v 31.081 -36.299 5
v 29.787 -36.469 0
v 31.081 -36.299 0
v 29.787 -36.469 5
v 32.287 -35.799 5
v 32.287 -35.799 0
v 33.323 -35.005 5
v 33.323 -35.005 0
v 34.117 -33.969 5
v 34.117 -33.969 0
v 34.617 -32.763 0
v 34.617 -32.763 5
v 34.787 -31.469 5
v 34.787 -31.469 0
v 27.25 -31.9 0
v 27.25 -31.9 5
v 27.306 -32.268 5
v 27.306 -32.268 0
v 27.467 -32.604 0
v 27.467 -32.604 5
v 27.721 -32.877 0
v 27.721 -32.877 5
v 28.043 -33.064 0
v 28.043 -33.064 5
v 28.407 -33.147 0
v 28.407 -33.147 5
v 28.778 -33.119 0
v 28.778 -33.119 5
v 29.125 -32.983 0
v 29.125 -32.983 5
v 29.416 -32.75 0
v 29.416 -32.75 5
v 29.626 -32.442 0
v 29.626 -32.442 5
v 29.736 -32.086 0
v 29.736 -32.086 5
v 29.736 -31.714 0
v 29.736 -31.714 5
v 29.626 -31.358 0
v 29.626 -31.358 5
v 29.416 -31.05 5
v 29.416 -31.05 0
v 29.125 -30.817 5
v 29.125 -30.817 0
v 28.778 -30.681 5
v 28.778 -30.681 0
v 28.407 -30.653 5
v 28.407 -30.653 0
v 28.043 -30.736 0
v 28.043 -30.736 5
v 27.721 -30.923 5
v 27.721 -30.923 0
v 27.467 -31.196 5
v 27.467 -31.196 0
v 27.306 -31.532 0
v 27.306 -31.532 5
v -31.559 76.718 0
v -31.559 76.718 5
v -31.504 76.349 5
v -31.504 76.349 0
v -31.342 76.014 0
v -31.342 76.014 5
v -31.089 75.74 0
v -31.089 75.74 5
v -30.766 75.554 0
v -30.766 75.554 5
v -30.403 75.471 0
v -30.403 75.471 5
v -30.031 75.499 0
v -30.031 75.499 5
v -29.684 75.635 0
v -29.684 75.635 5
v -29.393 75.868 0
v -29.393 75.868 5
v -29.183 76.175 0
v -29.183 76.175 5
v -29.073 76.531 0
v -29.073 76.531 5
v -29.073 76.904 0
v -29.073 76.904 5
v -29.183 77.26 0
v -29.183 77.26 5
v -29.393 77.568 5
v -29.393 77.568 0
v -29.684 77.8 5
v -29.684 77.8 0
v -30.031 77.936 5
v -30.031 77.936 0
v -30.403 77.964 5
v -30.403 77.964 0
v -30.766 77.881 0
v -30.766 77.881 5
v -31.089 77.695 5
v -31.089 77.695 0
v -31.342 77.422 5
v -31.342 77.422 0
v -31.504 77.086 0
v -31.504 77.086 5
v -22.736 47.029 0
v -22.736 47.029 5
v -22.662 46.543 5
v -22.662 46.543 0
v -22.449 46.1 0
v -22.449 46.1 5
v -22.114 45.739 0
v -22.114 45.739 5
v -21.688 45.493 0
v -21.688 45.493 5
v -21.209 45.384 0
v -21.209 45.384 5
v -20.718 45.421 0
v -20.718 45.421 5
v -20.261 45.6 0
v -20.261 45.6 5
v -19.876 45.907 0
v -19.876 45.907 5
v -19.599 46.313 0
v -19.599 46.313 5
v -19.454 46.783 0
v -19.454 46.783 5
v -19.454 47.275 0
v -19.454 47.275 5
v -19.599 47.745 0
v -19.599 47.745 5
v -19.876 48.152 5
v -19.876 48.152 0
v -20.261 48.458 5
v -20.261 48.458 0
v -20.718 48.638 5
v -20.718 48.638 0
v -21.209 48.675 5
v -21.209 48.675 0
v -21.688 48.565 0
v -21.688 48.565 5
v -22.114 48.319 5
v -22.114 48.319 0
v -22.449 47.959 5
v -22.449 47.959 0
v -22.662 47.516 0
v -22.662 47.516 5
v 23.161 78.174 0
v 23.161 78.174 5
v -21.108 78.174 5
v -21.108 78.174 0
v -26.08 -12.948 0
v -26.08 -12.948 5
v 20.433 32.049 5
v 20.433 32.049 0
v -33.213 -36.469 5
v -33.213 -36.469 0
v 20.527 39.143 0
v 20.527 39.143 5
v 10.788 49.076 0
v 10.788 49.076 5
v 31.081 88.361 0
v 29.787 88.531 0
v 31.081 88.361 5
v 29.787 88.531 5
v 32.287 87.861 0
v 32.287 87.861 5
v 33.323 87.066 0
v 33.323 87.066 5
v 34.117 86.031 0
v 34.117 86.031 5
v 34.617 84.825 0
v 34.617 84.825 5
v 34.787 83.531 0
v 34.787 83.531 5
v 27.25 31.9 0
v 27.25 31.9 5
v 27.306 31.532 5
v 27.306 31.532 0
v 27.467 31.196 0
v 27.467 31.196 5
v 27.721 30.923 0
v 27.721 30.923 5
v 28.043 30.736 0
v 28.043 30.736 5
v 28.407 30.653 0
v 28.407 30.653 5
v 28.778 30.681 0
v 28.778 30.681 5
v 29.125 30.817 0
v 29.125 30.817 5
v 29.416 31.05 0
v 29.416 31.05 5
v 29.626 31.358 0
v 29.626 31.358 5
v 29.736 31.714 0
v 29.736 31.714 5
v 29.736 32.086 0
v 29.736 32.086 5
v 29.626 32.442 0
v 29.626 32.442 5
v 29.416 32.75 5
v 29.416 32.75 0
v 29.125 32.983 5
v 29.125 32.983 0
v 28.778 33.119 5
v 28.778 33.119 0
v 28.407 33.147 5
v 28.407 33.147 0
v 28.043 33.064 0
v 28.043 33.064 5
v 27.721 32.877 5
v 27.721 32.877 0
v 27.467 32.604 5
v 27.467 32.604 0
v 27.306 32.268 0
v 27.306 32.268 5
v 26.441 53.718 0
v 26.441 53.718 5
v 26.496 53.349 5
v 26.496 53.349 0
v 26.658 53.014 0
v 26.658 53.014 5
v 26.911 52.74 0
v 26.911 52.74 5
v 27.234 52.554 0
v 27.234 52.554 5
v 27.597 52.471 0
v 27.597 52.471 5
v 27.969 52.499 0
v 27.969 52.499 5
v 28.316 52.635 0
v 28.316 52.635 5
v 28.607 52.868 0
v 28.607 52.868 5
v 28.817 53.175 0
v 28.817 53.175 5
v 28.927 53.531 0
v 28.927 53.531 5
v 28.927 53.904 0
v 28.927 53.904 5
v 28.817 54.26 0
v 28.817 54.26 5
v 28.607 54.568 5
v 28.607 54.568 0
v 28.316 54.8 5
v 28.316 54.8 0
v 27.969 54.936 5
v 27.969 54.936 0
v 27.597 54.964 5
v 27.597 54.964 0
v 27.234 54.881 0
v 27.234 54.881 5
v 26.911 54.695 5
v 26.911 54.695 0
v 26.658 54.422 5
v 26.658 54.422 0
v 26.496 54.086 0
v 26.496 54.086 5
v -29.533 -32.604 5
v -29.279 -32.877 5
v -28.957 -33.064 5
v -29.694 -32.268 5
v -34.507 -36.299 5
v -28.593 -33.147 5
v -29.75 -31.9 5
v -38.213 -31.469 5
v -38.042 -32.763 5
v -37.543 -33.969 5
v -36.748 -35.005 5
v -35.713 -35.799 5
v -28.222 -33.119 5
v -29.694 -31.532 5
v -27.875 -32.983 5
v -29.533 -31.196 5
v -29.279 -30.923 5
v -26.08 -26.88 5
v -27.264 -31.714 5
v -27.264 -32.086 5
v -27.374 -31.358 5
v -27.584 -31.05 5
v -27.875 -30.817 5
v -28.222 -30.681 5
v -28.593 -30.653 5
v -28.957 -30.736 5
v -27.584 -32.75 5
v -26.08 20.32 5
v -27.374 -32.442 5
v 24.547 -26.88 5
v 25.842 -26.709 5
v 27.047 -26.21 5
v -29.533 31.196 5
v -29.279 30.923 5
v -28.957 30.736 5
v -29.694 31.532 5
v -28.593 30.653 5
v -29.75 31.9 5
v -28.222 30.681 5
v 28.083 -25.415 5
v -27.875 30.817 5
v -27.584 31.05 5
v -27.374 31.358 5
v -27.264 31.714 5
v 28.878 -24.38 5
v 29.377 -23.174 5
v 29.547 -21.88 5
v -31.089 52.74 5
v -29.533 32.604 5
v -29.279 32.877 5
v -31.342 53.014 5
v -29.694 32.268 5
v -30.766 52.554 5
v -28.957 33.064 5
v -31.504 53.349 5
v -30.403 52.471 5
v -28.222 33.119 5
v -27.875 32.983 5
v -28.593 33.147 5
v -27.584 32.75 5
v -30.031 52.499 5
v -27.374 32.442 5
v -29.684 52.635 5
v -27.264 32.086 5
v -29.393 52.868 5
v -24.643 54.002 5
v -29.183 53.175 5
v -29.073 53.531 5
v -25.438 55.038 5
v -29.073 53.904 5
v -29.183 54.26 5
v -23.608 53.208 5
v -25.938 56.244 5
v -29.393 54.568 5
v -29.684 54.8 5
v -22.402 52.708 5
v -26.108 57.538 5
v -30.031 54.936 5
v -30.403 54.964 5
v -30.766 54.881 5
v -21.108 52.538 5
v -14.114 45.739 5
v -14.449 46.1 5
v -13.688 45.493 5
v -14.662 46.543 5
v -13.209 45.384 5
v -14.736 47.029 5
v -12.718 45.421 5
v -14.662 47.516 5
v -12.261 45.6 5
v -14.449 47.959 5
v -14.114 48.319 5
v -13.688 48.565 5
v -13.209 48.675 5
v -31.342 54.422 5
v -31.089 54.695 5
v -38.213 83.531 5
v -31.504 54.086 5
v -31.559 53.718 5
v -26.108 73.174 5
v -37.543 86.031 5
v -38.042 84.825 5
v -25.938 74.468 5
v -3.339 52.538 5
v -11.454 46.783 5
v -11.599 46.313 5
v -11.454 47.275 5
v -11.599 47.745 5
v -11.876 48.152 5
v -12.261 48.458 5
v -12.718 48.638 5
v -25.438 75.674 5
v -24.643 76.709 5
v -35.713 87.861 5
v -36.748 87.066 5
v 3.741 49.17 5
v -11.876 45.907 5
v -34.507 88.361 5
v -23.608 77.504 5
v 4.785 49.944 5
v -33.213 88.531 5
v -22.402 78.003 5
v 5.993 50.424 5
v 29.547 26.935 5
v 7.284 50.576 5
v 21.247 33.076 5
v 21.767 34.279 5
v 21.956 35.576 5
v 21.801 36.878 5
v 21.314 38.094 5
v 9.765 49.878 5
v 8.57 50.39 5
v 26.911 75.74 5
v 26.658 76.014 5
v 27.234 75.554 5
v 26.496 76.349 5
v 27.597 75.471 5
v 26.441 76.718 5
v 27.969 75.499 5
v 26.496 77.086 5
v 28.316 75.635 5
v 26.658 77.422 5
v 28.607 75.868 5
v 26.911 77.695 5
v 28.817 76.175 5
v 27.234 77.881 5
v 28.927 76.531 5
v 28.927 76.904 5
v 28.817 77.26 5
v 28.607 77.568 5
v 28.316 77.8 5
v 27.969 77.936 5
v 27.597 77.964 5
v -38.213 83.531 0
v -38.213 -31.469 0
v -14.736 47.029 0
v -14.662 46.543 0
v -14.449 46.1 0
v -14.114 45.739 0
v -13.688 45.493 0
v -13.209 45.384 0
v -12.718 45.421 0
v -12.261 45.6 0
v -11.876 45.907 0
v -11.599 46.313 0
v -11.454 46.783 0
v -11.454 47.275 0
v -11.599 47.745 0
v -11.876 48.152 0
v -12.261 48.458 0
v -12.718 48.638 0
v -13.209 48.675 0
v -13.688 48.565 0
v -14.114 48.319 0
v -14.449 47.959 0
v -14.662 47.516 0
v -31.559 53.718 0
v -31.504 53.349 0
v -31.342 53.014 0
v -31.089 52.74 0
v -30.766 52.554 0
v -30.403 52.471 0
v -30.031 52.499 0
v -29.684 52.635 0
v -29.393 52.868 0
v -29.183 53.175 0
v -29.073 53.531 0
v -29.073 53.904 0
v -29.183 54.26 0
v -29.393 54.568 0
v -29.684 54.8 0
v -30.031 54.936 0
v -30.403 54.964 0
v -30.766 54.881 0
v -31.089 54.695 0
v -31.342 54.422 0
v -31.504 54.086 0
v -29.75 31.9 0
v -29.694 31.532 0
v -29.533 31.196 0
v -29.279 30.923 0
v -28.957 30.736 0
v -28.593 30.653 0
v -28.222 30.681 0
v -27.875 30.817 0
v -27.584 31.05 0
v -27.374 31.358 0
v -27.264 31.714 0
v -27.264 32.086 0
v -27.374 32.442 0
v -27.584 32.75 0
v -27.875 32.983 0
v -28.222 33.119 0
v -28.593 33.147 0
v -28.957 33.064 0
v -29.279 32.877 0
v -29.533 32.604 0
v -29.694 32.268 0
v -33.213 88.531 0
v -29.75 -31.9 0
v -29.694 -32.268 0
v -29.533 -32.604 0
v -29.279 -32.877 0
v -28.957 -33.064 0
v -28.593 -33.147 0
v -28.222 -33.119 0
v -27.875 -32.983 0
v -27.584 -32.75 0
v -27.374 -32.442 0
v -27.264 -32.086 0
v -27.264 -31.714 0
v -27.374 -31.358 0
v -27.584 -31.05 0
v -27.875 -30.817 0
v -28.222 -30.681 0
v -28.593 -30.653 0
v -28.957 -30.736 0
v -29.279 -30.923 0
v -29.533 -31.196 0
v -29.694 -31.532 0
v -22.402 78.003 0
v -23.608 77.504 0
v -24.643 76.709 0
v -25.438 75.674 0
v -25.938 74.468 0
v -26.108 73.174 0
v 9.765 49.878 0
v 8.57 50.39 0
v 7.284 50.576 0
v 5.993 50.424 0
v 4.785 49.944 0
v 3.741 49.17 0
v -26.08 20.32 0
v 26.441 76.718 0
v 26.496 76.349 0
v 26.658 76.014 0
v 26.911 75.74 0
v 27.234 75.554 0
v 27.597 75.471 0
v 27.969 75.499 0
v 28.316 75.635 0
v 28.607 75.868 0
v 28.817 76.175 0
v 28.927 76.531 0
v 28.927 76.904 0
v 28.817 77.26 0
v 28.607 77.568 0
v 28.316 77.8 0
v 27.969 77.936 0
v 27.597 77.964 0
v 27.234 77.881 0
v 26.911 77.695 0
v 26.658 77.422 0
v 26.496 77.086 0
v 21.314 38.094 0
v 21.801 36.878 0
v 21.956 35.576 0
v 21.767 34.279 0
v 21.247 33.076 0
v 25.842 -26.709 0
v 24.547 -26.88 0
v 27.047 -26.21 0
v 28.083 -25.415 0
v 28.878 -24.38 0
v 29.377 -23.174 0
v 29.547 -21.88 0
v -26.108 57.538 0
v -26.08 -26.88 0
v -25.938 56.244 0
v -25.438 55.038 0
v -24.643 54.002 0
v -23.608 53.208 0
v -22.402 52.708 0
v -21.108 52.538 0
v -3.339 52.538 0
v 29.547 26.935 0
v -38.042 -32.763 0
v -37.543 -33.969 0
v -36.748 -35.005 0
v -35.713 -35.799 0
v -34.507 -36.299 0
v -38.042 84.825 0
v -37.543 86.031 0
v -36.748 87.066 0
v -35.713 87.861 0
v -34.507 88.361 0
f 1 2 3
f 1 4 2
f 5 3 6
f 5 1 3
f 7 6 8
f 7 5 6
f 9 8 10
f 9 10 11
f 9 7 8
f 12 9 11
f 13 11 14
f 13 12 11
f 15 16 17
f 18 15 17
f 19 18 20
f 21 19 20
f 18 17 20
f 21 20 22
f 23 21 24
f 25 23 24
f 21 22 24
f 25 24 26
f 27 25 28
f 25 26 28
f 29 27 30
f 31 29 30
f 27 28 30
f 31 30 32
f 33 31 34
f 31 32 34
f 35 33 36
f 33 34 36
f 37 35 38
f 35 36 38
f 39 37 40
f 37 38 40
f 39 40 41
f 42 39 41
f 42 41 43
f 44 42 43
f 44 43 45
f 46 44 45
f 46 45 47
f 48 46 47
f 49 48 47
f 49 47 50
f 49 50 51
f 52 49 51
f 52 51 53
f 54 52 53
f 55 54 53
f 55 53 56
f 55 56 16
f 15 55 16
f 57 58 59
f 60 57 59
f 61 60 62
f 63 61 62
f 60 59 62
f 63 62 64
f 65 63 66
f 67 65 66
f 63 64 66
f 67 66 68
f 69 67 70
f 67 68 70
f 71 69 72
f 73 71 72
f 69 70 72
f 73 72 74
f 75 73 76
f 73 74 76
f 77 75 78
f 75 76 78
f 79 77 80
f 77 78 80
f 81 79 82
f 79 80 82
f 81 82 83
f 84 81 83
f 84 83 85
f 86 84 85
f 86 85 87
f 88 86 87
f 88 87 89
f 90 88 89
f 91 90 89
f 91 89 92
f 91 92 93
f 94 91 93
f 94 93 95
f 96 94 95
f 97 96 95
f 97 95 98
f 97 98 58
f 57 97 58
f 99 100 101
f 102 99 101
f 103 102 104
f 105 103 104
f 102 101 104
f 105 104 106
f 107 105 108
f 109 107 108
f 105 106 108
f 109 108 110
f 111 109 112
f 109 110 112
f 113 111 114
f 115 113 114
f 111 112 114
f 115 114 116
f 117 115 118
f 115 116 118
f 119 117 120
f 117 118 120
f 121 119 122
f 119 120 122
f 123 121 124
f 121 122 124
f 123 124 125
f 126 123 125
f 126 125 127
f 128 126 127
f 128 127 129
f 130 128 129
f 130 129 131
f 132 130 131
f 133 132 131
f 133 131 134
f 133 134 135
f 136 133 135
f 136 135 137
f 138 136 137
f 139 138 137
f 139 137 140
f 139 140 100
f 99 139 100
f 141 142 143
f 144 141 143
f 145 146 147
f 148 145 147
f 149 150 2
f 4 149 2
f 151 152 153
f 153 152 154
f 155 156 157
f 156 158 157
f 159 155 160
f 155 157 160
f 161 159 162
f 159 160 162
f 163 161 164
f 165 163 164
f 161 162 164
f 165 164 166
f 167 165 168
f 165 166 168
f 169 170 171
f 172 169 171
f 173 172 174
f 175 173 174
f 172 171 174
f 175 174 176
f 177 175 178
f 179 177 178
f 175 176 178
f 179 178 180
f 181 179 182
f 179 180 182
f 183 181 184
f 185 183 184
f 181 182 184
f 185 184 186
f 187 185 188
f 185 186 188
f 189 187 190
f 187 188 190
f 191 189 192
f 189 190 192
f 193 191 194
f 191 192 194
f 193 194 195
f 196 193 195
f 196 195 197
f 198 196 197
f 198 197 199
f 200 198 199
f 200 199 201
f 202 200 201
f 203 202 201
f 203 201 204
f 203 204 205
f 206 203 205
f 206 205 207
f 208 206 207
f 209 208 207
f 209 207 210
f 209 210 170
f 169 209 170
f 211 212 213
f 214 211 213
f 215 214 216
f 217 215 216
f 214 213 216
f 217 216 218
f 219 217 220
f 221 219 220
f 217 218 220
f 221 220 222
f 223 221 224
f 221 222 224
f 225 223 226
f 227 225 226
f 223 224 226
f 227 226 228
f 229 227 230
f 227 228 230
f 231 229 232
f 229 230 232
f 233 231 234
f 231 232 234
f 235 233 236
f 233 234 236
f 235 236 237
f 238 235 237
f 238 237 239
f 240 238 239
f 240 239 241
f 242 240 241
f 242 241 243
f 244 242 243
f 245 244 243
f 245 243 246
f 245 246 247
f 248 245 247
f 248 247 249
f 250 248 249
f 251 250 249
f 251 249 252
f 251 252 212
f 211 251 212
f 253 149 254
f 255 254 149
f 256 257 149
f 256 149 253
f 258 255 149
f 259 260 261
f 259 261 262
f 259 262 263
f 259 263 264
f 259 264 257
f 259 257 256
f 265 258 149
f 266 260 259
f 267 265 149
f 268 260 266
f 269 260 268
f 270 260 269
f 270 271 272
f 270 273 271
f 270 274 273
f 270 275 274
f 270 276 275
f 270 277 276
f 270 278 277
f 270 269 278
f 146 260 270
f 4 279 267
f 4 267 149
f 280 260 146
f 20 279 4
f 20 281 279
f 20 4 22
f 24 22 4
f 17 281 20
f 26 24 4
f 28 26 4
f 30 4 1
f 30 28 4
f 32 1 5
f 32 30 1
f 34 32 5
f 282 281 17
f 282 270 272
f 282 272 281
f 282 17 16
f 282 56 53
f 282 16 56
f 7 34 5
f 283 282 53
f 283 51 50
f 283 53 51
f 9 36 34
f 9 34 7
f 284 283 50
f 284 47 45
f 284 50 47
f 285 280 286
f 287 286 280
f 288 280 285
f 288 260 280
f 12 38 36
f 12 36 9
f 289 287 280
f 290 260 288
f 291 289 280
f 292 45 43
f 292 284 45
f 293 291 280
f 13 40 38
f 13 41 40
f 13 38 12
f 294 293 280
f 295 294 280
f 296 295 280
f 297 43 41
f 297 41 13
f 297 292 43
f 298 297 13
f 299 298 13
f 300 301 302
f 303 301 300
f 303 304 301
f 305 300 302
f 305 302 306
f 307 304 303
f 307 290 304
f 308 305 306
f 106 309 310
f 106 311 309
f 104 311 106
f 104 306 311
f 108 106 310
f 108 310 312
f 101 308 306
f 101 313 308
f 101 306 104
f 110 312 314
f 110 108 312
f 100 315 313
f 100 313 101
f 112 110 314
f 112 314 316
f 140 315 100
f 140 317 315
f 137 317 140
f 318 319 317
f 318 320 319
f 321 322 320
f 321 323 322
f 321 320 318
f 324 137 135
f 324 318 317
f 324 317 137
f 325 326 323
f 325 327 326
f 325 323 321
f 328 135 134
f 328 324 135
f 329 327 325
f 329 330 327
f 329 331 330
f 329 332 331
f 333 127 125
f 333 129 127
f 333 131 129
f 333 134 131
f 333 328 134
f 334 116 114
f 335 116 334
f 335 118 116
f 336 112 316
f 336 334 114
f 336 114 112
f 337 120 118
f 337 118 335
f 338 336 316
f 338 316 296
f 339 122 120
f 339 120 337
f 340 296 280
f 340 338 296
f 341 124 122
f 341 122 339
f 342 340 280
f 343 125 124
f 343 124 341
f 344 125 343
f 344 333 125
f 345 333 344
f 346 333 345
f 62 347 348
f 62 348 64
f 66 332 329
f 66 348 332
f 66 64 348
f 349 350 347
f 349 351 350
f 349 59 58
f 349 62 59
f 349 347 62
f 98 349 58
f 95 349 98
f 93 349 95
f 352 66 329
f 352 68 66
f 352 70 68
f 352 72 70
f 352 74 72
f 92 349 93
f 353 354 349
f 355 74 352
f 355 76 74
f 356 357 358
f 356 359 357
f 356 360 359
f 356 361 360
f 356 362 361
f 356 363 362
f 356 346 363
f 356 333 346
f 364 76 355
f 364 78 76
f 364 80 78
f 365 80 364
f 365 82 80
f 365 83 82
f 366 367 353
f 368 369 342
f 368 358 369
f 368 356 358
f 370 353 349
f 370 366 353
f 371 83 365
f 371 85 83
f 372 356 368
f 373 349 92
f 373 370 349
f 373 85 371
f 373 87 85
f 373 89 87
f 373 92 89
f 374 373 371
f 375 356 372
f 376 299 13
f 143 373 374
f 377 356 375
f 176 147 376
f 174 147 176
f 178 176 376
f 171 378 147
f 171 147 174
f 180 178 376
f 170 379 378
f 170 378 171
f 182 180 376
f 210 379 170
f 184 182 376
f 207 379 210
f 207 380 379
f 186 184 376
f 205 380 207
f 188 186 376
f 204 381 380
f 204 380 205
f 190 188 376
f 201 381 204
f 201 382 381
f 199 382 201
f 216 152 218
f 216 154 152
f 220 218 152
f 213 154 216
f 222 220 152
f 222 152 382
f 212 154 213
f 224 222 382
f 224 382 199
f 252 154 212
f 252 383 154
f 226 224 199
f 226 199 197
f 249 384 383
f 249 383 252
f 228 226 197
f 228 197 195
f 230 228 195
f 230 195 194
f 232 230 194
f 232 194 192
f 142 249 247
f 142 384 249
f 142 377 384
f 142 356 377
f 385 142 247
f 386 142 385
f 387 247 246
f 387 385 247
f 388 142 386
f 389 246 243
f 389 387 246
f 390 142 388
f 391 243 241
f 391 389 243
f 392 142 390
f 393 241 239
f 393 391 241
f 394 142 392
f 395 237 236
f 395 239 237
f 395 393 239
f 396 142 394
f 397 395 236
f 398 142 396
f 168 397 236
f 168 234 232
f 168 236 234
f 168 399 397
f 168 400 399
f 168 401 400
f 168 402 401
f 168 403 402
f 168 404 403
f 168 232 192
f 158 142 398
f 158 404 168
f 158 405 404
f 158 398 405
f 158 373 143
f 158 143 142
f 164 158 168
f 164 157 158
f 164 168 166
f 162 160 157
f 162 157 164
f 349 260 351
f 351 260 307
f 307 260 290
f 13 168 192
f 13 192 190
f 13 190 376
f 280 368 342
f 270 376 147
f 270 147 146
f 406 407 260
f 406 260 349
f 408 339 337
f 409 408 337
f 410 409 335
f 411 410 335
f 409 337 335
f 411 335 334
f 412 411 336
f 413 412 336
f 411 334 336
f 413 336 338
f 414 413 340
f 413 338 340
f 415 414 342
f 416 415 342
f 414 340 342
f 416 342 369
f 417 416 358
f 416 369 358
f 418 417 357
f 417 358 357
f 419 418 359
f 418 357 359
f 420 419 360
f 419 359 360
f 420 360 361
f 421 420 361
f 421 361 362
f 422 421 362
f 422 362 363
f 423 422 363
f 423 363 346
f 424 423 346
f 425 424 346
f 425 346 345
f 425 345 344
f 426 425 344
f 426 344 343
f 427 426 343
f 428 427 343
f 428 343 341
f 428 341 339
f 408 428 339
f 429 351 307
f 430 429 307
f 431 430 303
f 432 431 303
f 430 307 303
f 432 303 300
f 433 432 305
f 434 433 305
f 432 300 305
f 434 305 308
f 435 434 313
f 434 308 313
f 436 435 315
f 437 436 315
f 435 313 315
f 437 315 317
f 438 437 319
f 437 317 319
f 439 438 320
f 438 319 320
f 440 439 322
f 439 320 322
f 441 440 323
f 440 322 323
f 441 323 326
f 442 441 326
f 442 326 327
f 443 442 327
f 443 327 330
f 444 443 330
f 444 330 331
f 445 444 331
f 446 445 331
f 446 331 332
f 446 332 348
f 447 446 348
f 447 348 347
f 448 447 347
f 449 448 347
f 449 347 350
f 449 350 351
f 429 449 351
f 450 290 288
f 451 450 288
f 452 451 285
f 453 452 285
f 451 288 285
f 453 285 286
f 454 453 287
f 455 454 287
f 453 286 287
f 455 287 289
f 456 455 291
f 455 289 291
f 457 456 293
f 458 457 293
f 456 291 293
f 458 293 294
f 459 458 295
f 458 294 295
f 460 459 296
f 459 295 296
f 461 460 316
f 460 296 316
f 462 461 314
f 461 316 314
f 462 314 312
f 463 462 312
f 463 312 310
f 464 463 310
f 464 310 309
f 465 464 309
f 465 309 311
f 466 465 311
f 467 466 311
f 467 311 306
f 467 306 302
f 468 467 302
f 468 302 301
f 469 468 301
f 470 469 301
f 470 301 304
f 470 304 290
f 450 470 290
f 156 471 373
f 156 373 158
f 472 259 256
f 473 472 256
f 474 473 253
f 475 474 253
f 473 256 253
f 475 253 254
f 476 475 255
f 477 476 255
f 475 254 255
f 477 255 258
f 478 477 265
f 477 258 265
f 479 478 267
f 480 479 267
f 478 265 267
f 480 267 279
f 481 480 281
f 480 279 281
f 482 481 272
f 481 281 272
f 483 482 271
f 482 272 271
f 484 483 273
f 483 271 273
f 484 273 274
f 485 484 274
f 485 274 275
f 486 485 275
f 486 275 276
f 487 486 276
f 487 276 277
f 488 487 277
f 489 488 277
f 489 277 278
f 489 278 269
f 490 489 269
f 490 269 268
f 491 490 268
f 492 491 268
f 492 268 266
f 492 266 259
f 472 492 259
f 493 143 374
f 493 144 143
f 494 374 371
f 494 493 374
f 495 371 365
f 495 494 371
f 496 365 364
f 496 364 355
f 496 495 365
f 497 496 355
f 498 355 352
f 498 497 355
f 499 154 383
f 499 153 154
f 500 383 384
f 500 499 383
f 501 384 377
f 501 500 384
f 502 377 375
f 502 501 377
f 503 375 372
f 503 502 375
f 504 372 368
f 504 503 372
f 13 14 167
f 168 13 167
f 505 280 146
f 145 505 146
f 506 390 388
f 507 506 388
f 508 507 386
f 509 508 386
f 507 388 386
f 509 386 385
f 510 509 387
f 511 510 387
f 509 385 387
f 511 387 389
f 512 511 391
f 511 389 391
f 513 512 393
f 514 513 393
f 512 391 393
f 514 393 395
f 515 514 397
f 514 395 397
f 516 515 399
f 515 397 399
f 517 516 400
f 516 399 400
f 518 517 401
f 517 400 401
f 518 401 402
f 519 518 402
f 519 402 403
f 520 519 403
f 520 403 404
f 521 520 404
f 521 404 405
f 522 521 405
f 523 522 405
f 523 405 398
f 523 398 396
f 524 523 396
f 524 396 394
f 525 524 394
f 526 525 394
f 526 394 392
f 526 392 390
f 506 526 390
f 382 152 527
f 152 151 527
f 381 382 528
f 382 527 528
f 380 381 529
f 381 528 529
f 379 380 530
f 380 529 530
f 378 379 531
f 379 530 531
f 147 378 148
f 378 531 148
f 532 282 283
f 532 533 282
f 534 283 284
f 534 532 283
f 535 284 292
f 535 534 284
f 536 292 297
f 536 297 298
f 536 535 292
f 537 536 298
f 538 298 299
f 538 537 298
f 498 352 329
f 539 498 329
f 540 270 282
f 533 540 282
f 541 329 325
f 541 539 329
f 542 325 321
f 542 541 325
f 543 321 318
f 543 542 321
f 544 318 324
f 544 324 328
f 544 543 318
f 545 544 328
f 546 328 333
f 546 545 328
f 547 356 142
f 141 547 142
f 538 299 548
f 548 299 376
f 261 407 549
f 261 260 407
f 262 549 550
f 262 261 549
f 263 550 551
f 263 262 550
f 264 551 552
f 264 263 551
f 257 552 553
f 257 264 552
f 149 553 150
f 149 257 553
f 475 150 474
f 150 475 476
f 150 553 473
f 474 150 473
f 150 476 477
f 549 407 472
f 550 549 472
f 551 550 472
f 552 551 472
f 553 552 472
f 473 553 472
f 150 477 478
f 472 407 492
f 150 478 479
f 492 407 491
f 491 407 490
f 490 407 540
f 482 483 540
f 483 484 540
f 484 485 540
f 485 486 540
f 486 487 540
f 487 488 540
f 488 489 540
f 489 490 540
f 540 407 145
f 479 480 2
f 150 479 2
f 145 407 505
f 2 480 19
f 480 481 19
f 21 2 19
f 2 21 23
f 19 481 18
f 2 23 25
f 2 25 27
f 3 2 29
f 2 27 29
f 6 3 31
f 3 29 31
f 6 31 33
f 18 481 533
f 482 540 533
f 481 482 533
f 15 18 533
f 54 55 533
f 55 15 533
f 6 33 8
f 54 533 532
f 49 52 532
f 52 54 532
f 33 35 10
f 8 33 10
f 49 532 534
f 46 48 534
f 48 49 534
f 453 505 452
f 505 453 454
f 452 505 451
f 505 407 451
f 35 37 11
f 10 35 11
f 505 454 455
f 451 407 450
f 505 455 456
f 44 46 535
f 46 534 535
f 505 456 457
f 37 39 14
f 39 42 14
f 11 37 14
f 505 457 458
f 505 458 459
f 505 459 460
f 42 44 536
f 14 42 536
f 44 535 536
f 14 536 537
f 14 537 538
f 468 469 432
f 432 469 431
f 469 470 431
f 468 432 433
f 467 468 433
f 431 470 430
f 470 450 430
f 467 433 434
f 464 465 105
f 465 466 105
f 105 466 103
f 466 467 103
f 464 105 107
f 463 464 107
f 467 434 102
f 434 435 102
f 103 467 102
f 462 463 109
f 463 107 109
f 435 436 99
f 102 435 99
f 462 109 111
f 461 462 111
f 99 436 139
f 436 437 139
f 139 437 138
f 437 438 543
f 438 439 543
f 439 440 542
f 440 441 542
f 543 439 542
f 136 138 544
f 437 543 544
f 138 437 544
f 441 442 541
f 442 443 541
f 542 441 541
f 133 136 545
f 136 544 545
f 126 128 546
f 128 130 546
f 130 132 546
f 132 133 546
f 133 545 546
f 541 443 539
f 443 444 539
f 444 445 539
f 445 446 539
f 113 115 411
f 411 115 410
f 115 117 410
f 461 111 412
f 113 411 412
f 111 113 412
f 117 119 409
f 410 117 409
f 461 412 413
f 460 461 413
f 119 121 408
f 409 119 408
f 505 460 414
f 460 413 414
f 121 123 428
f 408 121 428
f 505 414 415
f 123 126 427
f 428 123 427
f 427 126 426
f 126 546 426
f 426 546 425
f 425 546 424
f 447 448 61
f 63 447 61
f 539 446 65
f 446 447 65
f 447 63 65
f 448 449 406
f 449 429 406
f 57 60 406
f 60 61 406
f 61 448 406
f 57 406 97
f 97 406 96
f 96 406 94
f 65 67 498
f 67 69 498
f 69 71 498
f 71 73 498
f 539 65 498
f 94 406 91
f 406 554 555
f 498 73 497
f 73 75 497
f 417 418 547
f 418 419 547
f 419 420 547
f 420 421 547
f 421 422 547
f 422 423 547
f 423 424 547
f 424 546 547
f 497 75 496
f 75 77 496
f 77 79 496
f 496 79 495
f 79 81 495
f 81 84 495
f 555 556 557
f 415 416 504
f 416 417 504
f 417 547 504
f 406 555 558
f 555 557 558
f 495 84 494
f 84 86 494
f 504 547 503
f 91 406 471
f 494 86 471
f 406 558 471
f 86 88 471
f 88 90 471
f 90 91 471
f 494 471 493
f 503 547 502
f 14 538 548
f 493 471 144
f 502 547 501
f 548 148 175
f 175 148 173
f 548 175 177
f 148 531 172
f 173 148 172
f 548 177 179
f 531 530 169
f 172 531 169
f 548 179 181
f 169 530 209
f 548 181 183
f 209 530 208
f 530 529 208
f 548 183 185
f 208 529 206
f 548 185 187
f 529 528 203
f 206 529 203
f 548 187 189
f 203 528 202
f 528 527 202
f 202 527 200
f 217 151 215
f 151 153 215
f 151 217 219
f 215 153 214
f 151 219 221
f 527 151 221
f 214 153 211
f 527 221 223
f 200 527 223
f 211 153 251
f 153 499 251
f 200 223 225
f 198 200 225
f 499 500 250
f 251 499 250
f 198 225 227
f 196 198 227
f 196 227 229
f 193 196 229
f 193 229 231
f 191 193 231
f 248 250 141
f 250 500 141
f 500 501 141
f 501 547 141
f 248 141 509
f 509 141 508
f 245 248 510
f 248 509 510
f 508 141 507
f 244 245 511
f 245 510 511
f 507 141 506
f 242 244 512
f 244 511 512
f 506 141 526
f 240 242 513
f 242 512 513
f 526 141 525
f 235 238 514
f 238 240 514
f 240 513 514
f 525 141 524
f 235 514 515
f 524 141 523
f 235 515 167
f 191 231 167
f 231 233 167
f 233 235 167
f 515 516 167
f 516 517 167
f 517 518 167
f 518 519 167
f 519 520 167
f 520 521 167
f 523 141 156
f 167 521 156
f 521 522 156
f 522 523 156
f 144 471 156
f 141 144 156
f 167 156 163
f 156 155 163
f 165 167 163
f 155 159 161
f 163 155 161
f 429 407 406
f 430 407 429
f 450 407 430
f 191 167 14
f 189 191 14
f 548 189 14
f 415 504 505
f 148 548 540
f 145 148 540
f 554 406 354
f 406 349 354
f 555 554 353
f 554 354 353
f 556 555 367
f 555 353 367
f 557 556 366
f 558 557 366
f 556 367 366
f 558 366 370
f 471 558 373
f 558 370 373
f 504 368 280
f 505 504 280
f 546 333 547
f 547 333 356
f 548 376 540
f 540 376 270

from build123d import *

# Parameters (mm, degrees)
F0_W     = 73
F0_H     = 125
F1_DEPTH = 5
F2_D     = 2.5
F3_D     = 3.3
F4_D     = 2.5
F6_DEPTH = 25
F7_R     = 5


# Not quite as in the source:
# - a feature names something its author has since deleted; it is built from what else it names


with BuildPart() as f1:
    # F0 (on Top) → F1 (new body)
    with BuildSketch(Plane.XY):
        with Locations((-1.7126457989, 26.0309018195)):
            Rectangle(F0_W, F0_H)
    extrude(amount=F1_DEPTH)

    # F2 (through all)
    with Locations(Plane(origin=(0, 0, 0), x_dir=(1, 0, 0), z_dir=(0, 0, -1))):
        with Locations((-30.3091388196, -76.7177641392), (27.6908611804, -76.7177641392), (27.6908611804, -53.7177641392), (-30.3091388196, -53.7177641392)):
            Hole(F2_D / 2)

    # F3 (through all)
    with Locations(Plane(origin=(0, 0, 0), x_dir=(1, 0, 0), z_dir=(0, 0, -1))):
        with Locations((-21.0855398327, -47.0293052495), (-13.0855398327, -47.0293052495)):
            Hole(F3_D / 2)

    # F4 (through all)
    with Locations(Plane(origin=(0, 0, 0), x_dir=(1, 0, 0), z_dir=(0, 0, -1))):
        with Locations((-28.5, -31.9), (28.5, -31.9), (28.5, 31.9), (-28.5, 31.9)):
            Hole(F4_D / 2)

    # F5 (on face) → F6 (cut)
    with BuildSketch(Plane.XY.offset(5)):
        Polygon((24.0503107939, 35.5483236554), (7.3111363315, 52.6231595762), (-26.0799791984, 20.3202102417), (-26.0799791984, -12.9482956412), align=None)
        Polygon((29.5474557331, 26.9350063375), (-26.0799791984, -26.8796142191), (29.5474557331, -26.8796142191), align=None)
        Polygon((-3.3391041424, 52.5376833975), (23.1605084746, 78.173713526), (-26.1079283048, 78.173713526), (-26.1079283048, 52.5376833975), align=None)
    extrude(amount=-F6_DEPTH, mode=Mode.SUBTRACT)

    # F7
    f7_edges = [f1.edges().sort_by_distance(p)[0] for p in [
        (-38.212646, 88.530902, 2.5),
        (34.787354, 88.530902, 2.5),
        (34.787354, -36.469098, 2.5),
        (-38.212646, -36.469098, 2.5),
        (-26.107928, 52.537683, 2.5),
        (-26.107928, 78.173714, 2.5),
        (24.050311, 35.548324, 2.5),
        (7.311136, 52.62316, 2.5),
        (29.547456, -26.879614, 2.5),
    ]]
    fillet(f7_edges, radius=F7_R)


solid = f1.part
